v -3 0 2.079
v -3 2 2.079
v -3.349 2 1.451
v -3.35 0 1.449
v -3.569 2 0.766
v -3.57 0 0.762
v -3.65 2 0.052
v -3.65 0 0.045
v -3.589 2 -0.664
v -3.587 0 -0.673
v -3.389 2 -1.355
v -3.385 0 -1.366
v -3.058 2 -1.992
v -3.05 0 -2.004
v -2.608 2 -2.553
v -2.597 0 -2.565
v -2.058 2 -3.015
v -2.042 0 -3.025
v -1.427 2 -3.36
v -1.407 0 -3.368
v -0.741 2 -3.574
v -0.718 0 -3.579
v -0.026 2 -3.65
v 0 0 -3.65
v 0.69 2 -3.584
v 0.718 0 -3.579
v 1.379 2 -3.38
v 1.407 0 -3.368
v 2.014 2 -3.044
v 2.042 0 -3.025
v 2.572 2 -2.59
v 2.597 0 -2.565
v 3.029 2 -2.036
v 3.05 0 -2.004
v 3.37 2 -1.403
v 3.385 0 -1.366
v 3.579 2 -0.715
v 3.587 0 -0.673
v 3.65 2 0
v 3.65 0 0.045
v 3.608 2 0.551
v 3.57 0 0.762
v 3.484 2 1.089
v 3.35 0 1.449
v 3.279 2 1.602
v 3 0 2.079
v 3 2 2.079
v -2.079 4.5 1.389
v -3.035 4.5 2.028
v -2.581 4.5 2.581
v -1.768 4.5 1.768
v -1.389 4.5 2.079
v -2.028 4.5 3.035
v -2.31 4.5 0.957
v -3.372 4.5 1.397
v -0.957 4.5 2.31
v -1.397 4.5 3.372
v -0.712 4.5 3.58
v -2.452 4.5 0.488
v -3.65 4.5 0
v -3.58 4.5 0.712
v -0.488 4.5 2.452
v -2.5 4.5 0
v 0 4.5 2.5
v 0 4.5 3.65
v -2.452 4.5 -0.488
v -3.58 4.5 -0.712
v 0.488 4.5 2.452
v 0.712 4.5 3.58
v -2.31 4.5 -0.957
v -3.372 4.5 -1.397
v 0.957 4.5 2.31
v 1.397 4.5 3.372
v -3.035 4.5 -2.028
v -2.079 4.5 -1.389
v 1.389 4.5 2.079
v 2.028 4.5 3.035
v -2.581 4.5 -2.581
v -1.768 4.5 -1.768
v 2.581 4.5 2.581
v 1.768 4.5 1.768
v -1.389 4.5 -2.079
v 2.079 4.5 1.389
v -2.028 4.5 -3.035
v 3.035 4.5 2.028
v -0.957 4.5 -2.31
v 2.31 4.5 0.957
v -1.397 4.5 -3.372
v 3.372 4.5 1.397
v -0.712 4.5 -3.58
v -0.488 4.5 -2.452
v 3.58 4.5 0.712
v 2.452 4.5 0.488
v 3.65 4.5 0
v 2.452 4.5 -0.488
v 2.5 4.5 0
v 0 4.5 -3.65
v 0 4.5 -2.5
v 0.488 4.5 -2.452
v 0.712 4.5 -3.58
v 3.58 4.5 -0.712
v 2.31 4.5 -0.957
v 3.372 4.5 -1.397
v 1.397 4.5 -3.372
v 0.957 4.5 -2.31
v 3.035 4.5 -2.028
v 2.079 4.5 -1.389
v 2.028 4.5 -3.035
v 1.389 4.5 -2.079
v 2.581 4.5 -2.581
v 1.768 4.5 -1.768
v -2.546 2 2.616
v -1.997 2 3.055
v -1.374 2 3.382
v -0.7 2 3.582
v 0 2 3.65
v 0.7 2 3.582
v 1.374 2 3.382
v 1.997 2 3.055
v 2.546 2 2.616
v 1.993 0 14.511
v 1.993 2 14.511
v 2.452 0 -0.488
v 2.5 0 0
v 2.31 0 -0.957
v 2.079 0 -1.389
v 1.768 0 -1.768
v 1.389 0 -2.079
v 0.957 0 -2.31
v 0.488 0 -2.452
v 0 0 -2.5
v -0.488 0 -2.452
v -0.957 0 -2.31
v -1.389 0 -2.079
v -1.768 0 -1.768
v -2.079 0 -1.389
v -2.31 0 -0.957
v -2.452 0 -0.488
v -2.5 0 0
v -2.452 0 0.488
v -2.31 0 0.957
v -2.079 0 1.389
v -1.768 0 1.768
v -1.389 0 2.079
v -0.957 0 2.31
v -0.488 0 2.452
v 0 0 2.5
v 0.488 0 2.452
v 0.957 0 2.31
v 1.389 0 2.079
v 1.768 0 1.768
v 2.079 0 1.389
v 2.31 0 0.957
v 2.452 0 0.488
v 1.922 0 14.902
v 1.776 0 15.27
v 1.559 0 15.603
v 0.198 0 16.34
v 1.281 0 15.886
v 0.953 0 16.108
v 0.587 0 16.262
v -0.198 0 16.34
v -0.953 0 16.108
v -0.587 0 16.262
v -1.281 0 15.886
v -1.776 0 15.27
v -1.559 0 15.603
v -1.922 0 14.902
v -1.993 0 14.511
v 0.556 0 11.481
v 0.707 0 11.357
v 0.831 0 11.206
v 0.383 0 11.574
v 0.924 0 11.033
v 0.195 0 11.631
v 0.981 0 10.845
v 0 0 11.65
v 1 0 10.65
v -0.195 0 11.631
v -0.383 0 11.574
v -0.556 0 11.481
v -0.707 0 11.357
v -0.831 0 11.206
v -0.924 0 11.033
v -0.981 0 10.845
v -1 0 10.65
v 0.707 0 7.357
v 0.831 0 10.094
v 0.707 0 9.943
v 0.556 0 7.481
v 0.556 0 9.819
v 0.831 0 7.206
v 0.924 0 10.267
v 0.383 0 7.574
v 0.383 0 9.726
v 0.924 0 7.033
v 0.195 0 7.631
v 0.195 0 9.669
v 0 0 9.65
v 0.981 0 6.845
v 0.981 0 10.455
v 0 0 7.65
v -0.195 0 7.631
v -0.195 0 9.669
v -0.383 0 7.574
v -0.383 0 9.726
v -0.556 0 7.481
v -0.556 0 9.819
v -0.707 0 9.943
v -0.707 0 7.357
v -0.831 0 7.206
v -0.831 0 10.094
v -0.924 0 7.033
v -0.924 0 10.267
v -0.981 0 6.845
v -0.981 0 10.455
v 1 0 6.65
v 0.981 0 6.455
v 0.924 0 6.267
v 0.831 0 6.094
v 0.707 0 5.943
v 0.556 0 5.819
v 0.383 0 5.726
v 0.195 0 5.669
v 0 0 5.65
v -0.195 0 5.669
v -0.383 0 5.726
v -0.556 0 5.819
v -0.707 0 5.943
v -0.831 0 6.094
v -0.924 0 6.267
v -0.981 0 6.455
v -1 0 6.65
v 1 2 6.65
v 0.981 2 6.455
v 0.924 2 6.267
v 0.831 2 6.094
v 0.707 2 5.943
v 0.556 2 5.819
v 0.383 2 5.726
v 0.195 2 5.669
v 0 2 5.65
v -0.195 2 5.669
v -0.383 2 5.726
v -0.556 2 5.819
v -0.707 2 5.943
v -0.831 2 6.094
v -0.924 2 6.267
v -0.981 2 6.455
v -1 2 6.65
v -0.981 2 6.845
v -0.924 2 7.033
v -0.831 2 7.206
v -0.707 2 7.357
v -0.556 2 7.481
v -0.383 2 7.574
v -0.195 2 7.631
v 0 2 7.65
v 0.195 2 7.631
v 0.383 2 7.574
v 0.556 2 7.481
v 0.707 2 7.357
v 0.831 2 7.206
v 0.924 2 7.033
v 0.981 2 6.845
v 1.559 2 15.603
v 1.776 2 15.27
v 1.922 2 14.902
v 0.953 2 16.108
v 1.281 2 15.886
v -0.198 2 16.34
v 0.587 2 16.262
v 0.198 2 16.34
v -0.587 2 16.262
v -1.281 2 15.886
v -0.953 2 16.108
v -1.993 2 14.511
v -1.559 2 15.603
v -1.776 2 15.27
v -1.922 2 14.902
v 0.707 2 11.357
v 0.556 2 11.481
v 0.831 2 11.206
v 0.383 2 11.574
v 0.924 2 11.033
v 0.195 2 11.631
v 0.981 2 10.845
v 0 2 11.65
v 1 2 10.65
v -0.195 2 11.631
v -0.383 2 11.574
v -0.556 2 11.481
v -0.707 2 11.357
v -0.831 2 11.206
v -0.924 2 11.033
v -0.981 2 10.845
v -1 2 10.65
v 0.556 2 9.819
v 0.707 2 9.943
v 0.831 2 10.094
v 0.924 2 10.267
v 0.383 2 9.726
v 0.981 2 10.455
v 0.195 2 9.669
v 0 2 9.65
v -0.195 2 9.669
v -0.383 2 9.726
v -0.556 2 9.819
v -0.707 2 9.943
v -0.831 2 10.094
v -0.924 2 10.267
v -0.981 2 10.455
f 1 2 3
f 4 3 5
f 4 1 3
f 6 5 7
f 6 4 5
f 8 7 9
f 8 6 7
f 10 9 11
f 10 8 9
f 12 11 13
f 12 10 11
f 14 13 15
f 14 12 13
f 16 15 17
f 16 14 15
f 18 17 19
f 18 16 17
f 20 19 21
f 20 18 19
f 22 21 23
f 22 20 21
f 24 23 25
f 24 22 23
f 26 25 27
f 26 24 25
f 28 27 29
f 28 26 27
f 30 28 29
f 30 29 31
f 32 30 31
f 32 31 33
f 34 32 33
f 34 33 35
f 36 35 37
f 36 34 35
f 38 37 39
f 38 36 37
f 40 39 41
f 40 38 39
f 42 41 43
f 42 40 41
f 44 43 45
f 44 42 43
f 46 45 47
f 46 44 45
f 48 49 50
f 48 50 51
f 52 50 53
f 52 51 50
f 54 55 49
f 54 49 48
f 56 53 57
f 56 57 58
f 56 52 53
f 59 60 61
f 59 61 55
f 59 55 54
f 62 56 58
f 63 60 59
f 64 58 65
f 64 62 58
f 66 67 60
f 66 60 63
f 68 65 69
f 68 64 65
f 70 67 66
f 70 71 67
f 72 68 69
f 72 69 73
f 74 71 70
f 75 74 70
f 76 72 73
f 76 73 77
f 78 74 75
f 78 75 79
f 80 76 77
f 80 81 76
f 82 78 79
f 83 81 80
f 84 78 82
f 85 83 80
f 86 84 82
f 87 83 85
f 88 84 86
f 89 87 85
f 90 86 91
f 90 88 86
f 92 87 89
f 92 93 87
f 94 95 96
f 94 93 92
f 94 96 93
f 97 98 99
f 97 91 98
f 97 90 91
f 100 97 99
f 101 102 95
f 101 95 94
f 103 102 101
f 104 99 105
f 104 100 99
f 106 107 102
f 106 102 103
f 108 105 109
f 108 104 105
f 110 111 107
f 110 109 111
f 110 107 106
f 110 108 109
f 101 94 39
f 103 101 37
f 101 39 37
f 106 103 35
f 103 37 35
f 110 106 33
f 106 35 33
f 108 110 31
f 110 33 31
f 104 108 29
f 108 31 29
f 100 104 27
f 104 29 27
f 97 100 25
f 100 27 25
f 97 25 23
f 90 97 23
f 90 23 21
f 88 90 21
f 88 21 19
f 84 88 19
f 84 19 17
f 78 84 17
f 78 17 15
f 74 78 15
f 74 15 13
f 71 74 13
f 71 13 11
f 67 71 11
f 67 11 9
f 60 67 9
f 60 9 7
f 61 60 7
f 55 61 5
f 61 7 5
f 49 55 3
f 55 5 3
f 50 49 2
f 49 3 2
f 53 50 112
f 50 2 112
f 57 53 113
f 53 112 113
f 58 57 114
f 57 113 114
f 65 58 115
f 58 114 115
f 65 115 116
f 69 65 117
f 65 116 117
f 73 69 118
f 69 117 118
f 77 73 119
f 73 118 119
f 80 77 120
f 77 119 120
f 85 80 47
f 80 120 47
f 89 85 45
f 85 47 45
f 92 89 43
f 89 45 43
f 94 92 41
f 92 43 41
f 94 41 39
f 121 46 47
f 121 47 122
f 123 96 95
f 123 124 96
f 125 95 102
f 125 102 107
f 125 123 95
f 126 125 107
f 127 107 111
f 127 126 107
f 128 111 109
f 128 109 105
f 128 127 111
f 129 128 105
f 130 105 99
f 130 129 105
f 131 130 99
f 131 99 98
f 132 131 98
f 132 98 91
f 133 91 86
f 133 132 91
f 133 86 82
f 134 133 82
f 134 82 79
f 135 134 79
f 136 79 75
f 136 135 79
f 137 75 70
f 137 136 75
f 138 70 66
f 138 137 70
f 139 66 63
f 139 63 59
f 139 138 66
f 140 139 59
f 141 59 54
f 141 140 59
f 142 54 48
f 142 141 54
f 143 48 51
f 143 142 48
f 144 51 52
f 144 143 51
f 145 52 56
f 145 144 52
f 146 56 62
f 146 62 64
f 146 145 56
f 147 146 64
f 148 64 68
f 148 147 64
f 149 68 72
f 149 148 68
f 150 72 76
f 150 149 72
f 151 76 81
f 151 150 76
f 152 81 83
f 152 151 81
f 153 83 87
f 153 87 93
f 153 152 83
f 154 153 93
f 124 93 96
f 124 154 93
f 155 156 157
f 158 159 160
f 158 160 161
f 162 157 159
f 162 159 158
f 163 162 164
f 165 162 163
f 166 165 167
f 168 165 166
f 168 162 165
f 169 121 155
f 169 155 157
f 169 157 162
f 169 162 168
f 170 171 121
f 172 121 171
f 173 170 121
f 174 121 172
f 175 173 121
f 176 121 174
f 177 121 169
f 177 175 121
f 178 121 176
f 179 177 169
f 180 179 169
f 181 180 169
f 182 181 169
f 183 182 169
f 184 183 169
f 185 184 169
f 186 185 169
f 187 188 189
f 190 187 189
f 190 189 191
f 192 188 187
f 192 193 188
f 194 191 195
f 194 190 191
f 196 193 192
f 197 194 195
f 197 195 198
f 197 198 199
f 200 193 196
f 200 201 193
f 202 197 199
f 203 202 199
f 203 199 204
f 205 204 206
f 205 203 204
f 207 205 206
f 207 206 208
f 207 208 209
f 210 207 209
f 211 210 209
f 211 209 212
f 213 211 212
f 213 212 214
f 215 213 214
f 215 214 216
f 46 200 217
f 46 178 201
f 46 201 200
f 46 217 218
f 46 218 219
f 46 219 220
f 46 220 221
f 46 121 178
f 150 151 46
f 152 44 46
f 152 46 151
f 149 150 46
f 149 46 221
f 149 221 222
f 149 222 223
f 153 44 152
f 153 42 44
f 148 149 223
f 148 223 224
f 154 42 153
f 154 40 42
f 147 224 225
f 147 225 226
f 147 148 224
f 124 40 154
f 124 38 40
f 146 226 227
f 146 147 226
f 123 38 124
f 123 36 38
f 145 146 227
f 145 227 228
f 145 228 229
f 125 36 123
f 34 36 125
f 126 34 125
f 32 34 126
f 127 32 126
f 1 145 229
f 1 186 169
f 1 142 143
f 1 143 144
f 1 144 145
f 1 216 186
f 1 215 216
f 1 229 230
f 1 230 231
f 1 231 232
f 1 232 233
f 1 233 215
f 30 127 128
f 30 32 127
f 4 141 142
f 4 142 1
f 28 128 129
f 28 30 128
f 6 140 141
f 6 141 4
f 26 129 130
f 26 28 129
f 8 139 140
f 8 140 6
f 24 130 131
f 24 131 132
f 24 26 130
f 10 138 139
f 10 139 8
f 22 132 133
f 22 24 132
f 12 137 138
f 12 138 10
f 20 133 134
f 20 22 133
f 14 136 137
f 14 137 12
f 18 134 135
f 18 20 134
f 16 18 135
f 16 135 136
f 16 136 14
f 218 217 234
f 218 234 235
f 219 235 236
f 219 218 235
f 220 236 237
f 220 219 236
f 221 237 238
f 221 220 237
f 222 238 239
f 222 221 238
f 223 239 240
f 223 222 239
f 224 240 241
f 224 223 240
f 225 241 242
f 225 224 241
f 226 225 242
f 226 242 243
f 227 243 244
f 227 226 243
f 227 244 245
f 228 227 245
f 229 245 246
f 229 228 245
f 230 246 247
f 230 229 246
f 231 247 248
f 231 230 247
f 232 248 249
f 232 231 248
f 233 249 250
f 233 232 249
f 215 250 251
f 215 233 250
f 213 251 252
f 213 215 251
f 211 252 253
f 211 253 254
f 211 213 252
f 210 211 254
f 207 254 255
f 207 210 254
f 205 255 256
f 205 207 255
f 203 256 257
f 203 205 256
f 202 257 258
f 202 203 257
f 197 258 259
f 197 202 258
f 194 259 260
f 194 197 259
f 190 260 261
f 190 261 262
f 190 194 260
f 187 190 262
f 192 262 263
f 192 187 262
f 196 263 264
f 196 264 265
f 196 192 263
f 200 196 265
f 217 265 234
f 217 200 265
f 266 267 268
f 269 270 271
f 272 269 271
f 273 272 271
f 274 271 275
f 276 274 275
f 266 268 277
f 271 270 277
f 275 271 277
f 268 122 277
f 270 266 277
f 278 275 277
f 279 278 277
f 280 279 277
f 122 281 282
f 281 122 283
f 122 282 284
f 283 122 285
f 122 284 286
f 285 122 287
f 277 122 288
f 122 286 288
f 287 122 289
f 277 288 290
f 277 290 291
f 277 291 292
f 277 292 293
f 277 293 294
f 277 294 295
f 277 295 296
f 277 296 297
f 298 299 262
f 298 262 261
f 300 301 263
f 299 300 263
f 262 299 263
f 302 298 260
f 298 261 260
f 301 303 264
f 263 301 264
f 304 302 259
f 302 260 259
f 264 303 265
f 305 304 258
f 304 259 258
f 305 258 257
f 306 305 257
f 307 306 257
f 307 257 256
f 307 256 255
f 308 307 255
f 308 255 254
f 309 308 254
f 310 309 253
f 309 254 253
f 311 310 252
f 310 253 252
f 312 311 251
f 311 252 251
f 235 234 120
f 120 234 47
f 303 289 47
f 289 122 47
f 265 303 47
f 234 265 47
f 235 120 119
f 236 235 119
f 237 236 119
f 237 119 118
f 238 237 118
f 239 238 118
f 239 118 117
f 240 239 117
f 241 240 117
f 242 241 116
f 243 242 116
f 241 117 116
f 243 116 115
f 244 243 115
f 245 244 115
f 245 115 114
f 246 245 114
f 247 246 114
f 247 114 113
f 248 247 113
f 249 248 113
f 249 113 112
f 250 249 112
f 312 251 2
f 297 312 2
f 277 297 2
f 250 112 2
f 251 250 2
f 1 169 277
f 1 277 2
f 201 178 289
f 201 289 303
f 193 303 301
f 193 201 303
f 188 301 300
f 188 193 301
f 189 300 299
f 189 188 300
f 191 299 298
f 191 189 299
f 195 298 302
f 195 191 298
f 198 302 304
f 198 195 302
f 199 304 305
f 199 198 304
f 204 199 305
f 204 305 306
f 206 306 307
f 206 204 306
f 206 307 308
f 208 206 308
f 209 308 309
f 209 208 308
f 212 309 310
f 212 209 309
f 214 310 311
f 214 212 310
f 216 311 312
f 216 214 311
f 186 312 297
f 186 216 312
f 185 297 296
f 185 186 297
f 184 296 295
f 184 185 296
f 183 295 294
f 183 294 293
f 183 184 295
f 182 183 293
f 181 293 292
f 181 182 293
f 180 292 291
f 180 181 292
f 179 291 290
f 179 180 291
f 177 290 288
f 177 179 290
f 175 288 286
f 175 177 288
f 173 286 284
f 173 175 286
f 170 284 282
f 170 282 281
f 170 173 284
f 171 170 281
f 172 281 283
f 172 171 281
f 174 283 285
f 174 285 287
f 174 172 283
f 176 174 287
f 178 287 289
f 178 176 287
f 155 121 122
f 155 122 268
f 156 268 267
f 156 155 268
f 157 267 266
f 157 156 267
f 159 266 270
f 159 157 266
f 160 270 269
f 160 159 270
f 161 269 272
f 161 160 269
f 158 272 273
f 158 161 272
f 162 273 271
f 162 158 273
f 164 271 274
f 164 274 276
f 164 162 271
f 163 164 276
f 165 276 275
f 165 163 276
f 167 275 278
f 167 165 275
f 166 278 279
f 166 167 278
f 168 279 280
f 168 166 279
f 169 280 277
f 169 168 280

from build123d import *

# Parameters (mm, degrees)
SKETCH1_R           = 1
SKETCH1_R_2         = 2.5
BOSS_EXTRUDE1_DEPTH = 2
SKETCH2_R           = 3.65
SKETCH2_R_2         = 2.5
BOSS_EXTRUDE2_DEPTH = 2.5


with BuildPart() as part:
    # Sketch1 → Boss-Extrude1 (new body)
    with BuildSketch(Plane(origin=(0, 0, 0), x_dir=(1, 0, 0), z_dir=(0, 1, 0))):
        with BuildLine():
            Line((3, -2.079062289), (1.993477511, -14.51139211))
            ThreePointArc((1.993477511, -14.51139211), (0, -16.35), (-1.993477511, -14.51139211))
            Line((-1.993477511, -14.51139211), (-3, -2.079062289))
            ThreePointArc((-3, -2.079062289), (0, 3.65), (3, -2.079062289))
        make_face()
        with Locations((0, -6.65)):
            Circle(SKETCH1_R, mode=Mode.SUBTRACT)
        with Locations((0, -10.65)):
            Circle(SKETCH1_R, mode=Mode.SUBTRACT)
        Circle(SKETCH1_R_2, mode=Mode.SUBTRACT)
    extrude(amount=BOSS_EXTRUDE1_DEPTH)

    # Sketch2 → Boss-Extrude2 (add)
    with BuildSketch(Plane(origin=(0, 2, 0), x_dir=(1, 0, 0), z_dir=(0, 1, 0))):
        Circle(SKETCH2_R)
        Circle(SKETCH2_R_2, mode=Mode.SUBTRACT)
    extrude(amount=BOSS_EXTRUDE2_DEPTH)


solid = part.part
